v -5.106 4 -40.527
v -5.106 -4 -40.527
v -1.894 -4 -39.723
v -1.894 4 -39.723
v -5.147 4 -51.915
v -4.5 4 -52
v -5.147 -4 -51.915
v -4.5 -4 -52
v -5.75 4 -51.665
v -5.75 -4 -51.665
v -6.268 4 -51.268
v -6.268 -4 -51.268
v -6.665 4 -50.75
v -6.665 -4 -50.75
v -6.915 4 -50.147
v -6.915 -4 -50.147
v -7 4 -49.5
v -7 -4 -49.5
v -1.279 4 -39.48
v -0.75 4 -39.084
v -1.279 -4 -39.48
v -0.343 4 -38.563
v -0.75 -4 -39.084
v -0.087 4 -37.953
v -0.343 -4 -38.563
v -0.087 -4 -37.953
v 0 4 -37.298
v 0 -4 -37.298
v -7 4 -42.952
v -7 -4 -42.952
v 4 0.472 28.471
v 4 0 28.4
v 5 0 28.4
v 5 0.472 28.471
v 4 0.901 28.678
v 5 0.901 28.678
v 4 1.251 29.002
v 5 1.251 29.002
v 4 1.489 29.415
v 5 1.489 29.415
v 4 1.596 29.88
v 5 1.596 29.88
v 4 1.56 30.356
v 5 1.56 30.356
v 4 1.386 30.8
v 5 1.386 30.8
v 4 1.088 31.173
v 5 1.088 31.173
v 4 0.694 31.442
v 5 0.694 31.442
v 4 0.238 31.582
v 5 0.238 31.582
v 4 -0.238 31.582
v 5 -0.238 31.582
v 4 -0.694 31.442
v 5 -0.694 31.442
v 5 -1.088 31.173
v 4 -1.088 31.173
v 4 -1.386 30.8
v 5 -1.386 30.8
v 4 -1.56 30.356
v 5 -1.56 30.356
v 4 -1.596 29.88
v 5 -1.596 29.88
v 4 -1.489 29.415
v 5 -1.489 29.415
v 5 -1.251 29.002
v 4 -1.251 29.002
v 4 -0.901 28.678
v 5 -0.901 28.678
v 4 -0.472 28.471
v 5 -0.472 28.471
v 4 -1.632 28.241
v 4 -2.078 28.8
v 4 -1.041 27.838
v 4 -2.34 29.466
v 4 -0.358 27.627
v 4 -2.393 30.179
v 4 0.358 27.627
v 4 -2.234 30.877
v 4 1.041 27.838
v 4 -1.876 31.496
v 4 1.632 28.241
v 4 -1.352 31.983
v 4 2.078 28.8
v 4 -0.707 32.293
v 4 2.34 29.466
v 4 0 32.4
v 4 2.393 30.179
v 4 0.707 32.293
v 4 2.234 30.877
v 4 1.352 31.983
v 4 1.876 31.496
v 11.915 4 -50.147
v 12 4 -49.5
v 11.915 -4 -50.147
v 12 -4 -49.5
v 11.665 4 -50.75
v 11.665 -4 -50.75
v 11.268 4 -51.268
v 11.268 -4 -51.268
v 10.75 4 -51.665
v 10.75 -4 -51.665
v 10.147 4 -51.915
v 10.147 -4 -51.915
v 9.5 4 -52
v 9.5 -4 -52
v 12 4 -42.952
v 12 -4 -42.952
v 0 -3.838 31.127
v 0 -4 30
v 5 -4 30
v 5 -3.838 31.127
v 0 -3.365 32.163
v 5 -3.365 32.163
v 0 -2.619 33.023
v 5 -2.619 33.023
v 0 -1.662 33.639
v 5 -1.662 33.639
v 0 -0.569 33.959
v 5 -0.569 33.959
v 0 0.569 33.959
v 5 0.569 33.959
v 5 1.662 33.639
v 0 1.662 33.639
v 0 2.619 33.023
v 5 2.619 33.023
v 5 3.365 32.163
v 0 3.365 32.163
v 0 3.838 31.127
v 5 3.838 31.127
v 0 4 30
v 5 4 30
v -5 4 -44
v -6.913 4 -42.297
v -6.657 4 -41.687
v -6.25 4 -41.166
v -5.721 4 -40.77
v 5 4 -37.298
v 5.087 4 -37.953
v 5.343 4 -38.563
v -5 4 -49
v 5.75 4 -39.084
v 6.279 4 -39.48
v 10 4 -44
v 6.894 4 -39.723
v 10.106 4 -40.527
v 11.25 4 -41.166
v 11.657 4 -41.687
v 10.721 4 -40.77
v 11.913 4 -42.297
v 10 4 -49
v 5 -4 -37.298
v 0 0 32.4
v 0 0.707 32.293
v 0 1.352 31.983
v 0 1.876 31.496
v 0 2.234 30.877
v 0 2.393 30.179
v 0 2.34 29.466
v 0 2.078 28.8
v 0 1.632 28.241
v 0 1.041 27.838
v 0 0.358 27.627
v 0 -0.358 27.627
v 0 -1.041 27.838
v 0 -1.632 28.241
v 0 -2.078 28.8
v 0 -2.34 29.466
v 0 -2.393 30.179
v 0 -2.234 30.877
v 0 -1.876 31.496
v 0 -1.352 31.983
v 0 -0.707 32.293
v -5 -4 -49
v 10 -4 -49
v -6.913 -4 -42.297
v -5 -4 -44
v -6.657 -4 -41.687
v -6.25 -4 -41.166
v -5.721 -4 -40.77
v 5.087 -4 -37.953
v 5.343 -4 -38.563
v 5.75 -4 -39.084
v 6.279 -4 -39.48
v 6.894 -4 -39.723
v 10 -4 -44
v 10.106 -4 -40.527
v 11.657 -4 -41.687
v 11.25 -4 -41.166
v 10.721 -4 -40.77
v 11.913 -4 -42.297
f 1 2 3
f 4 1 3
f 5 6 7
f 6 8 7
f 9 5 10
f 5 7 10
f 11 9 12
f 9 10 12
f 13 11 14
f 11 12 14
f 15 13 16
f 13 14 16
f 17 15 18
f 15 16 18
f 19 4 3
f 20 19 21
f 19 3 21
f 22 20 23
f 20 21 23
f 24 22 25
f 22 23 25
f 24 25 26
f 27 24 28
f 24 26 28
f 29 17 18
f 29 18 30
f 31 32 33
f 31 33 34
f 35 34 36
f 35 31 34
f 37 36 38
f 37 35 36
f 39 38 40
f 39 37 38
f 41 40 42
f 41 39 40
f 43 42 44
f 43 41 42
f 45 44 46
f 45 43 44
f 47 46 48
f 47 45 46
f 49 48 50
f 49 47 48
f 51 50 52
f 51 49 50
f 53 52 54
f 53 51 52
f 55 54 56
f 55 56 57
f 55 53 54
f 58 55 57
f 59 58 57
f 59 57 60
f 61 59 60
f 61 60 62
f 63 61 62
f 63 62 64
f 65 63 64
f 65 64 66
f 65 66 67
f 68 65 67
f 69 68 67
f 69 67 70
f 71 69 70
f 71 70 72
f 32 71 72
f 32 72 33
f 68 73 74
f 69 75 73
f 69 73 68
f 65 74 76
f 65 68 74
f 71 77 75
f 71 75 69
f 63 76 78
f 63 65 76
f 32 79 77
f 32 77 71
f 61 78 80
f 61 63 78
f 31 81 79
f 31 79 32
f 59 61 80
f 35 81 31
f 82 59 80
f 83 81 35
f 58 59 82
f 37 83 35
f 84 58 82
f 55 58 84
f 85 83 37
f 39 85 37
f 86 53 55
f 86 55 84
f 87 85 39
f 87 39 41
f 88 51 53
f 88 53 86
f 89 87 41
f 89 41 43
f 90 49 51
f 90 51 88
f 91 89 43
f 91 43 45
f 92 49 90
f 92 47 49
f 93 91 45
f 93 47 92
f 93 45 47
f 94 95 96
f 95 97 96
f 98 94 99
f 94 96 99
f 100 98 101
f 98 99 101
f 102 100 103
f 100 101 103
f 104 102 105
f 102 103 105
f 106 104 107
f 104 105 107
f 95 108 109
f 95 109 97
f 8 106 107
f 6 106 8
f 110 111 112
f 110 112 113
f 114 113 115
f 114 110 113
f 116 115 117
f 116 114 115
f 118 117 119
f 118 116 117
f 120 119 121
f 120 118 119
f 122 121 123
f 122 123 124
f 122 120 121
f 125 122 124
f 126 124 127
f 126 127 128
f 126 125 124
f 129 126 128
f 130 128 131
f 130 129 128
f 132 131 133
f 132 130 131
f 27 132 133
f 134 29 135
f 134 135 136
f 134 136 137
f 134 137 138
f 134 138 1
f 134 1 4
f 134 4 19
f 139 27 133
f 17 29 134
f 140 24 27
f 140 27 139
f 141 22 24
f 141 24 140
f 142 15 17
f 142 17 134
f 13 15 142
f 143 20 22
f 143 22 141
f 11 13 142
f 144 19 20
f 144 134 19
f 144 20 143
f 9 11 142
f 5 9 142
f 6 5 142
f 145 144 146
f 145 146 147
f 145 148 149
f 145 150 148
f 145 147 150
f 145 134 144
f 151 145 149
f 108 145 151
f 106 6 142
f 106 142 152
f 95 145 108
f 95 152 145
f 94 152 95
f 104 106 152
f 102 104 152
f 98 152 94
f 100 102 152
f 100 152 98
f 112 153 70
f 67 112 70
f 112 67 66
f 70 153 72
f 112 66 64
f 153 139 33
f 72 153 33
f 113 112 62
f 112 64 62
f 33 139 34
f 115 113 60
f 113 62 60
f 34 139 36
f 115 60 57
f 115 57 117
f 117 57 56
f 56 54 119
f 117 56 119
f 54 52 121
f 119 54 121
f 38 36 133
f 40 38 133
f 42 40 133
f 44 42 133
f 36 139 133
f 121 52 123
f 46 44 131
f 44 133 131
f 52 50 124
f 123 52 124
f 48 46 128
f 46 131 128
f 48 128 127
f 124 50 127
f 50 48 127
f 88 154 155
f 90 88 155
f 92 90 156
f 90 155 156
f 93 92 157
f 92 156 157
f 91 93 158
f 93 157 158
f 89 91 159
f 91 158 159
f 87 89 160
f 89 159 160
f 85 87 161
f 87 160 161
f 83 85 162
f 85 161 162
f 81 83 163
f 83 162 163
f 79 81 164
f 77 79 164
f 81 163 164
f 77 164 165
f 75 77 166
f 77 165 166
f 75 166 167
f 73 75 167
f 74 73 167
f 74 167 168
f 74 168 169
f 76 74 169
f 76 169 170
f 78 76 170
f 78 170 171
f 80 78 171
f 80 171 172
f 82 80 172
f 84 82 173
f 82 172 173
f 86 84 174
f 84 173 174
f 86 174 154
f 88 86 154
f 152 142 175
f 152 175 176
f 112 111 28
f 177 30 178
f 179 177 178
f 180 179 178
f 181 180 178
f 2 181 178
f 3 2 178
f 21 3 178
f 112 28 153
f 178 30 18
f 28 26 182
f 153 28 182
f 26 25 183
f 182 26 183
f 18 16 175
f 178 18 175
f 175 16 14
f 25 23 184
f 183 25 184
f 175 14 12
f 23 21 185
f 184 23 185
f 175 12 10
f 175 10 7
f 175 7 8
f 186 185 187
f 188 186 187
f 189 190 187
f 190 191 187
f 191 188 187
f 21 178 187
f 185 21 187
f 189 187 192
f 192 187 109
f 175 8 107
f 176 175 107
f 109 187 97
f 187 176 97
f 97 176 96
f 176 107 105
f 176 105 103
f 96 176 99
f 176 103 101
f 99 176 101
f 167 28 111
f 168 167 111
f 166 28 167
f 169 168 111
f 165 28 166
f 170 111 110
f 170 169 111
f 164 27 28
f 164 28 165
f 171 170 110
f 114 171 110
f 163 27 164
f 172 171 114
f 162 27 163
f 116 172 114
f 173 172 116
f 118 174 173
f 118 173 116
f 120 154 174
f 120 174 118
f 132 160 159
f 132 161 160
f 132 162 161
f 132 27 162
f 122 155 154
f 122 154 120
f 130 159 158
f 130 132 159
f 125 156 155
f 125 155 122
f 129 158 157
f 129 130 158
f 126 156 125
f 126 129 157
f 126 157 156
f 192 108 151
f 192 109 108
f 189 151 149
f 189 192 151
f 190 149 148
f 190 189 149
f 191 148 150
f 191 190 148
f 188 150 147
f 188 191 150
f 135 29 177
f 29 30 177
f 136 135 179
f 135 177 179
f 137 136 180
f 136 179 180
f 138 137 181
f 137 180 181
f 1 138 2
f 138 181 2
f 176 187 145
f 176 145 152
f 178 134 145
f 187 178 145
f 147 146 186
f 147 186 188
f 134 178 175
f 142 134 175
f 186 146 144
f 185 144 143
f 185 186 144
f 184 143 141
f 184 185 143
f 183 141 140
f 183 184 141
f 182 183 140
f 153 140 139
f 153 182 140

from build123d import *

# Parameters (mm, degrees)
ESQUISSE1_R             = 1.6
BOSS_EXTRU_1_DEPTH      = 5
ESQUISSE3_W             = 15
ESQUISSE3_H             = 5
BOSS_EXTRU_2_DEPTH      = 8
ESQUISSE4_R             = 2.4
ENL_V_MAT_EXTRU_1_DEPTH = 4
CONG_2_R                = 2.5


with BuildPart() as part:
    # Esquisse1 → Boss.-Extru.1 (new body)
    with BuildSketch(Plane(origin=(0, 0, 0), x_dir=(0, 0, -1), z_dir=(1, 0, 0))):
        with BuildLine():
            Line((-30, 4), (41, 4))
            Line((41, 4), (41, -4))
            Line((41, -4), (-30, -4))
            ThreePointArc((-30, -4), (-34, 0), (-30, 4))
        make_face()
        with Locations((-30, 0)):
            Circle(ESQUISSE1_R, mode=Mode.SUBTRACT)
    extrude(amount=BOSS_EXTRU_1_DEPTH)

    # Esquisse3 → Boss.-Extru.2 (add)
    # profile 1 of 3: a face of its own
    with BuildSketch(Plane(origin=(0, 4, 0), x_dir=(1, 0, 0), z_dir=(0, 1, 0))):
        Polygon((5, 41), (12, 41), (12, 52), (-7, 52), (-7, 41), (0, 41), align=None)
        with Locations((2.5, 46.5)):
            Rectangle(ESQUISSE3_W, ESQUISSE3_H, mode=Mode.SUBTRACT)
    # profile 2 of 3: a face of its own
    with BuildSketch(Plane(origin=(0, 4, 0), x_dir=(1, 0, 0), z_dir=(0, 1, 0))):
        Polygon((0, 39.25), (0, 41), (-7, 41), align=None)
    # profile 3 of 3: a face of its own
    with BuildSketch(Plane(origin=(0, 4, 0), x_dir=(1, 0, 0), z_dir=(0, 1, 0))):
        Polygon((12, 41), (5, 41), (5, 39.25), align=None)
    extrude(amount=-BOSS_EXTRU_2_DEPTH)

    # Esquisse4 → Enlèv. mat.-Extru.1 (cut)
    with BuildSketch(Plane.ZY):
        with Locations((30, 0)):
            Circle(ESQUISSE4_R)
    extrude(amount=-ENL_V_MAT_EXTRU_1_DEPTH, mode=Mode.SUBTRACT)

    # Congé2
    cong_2_edges = [part.edges().sort_by_distance(p)[0] for p in [
        (0, 0, -39.25),
        (-7, 0, -41),
        (-7, 0, -52),
        (12, 0, -52),
        (12, 0, -41),
        (5, 0, -39.25),
    ]]
    fillet(cong_2_edges, radius=CONG_2_R)


solid = part.part
